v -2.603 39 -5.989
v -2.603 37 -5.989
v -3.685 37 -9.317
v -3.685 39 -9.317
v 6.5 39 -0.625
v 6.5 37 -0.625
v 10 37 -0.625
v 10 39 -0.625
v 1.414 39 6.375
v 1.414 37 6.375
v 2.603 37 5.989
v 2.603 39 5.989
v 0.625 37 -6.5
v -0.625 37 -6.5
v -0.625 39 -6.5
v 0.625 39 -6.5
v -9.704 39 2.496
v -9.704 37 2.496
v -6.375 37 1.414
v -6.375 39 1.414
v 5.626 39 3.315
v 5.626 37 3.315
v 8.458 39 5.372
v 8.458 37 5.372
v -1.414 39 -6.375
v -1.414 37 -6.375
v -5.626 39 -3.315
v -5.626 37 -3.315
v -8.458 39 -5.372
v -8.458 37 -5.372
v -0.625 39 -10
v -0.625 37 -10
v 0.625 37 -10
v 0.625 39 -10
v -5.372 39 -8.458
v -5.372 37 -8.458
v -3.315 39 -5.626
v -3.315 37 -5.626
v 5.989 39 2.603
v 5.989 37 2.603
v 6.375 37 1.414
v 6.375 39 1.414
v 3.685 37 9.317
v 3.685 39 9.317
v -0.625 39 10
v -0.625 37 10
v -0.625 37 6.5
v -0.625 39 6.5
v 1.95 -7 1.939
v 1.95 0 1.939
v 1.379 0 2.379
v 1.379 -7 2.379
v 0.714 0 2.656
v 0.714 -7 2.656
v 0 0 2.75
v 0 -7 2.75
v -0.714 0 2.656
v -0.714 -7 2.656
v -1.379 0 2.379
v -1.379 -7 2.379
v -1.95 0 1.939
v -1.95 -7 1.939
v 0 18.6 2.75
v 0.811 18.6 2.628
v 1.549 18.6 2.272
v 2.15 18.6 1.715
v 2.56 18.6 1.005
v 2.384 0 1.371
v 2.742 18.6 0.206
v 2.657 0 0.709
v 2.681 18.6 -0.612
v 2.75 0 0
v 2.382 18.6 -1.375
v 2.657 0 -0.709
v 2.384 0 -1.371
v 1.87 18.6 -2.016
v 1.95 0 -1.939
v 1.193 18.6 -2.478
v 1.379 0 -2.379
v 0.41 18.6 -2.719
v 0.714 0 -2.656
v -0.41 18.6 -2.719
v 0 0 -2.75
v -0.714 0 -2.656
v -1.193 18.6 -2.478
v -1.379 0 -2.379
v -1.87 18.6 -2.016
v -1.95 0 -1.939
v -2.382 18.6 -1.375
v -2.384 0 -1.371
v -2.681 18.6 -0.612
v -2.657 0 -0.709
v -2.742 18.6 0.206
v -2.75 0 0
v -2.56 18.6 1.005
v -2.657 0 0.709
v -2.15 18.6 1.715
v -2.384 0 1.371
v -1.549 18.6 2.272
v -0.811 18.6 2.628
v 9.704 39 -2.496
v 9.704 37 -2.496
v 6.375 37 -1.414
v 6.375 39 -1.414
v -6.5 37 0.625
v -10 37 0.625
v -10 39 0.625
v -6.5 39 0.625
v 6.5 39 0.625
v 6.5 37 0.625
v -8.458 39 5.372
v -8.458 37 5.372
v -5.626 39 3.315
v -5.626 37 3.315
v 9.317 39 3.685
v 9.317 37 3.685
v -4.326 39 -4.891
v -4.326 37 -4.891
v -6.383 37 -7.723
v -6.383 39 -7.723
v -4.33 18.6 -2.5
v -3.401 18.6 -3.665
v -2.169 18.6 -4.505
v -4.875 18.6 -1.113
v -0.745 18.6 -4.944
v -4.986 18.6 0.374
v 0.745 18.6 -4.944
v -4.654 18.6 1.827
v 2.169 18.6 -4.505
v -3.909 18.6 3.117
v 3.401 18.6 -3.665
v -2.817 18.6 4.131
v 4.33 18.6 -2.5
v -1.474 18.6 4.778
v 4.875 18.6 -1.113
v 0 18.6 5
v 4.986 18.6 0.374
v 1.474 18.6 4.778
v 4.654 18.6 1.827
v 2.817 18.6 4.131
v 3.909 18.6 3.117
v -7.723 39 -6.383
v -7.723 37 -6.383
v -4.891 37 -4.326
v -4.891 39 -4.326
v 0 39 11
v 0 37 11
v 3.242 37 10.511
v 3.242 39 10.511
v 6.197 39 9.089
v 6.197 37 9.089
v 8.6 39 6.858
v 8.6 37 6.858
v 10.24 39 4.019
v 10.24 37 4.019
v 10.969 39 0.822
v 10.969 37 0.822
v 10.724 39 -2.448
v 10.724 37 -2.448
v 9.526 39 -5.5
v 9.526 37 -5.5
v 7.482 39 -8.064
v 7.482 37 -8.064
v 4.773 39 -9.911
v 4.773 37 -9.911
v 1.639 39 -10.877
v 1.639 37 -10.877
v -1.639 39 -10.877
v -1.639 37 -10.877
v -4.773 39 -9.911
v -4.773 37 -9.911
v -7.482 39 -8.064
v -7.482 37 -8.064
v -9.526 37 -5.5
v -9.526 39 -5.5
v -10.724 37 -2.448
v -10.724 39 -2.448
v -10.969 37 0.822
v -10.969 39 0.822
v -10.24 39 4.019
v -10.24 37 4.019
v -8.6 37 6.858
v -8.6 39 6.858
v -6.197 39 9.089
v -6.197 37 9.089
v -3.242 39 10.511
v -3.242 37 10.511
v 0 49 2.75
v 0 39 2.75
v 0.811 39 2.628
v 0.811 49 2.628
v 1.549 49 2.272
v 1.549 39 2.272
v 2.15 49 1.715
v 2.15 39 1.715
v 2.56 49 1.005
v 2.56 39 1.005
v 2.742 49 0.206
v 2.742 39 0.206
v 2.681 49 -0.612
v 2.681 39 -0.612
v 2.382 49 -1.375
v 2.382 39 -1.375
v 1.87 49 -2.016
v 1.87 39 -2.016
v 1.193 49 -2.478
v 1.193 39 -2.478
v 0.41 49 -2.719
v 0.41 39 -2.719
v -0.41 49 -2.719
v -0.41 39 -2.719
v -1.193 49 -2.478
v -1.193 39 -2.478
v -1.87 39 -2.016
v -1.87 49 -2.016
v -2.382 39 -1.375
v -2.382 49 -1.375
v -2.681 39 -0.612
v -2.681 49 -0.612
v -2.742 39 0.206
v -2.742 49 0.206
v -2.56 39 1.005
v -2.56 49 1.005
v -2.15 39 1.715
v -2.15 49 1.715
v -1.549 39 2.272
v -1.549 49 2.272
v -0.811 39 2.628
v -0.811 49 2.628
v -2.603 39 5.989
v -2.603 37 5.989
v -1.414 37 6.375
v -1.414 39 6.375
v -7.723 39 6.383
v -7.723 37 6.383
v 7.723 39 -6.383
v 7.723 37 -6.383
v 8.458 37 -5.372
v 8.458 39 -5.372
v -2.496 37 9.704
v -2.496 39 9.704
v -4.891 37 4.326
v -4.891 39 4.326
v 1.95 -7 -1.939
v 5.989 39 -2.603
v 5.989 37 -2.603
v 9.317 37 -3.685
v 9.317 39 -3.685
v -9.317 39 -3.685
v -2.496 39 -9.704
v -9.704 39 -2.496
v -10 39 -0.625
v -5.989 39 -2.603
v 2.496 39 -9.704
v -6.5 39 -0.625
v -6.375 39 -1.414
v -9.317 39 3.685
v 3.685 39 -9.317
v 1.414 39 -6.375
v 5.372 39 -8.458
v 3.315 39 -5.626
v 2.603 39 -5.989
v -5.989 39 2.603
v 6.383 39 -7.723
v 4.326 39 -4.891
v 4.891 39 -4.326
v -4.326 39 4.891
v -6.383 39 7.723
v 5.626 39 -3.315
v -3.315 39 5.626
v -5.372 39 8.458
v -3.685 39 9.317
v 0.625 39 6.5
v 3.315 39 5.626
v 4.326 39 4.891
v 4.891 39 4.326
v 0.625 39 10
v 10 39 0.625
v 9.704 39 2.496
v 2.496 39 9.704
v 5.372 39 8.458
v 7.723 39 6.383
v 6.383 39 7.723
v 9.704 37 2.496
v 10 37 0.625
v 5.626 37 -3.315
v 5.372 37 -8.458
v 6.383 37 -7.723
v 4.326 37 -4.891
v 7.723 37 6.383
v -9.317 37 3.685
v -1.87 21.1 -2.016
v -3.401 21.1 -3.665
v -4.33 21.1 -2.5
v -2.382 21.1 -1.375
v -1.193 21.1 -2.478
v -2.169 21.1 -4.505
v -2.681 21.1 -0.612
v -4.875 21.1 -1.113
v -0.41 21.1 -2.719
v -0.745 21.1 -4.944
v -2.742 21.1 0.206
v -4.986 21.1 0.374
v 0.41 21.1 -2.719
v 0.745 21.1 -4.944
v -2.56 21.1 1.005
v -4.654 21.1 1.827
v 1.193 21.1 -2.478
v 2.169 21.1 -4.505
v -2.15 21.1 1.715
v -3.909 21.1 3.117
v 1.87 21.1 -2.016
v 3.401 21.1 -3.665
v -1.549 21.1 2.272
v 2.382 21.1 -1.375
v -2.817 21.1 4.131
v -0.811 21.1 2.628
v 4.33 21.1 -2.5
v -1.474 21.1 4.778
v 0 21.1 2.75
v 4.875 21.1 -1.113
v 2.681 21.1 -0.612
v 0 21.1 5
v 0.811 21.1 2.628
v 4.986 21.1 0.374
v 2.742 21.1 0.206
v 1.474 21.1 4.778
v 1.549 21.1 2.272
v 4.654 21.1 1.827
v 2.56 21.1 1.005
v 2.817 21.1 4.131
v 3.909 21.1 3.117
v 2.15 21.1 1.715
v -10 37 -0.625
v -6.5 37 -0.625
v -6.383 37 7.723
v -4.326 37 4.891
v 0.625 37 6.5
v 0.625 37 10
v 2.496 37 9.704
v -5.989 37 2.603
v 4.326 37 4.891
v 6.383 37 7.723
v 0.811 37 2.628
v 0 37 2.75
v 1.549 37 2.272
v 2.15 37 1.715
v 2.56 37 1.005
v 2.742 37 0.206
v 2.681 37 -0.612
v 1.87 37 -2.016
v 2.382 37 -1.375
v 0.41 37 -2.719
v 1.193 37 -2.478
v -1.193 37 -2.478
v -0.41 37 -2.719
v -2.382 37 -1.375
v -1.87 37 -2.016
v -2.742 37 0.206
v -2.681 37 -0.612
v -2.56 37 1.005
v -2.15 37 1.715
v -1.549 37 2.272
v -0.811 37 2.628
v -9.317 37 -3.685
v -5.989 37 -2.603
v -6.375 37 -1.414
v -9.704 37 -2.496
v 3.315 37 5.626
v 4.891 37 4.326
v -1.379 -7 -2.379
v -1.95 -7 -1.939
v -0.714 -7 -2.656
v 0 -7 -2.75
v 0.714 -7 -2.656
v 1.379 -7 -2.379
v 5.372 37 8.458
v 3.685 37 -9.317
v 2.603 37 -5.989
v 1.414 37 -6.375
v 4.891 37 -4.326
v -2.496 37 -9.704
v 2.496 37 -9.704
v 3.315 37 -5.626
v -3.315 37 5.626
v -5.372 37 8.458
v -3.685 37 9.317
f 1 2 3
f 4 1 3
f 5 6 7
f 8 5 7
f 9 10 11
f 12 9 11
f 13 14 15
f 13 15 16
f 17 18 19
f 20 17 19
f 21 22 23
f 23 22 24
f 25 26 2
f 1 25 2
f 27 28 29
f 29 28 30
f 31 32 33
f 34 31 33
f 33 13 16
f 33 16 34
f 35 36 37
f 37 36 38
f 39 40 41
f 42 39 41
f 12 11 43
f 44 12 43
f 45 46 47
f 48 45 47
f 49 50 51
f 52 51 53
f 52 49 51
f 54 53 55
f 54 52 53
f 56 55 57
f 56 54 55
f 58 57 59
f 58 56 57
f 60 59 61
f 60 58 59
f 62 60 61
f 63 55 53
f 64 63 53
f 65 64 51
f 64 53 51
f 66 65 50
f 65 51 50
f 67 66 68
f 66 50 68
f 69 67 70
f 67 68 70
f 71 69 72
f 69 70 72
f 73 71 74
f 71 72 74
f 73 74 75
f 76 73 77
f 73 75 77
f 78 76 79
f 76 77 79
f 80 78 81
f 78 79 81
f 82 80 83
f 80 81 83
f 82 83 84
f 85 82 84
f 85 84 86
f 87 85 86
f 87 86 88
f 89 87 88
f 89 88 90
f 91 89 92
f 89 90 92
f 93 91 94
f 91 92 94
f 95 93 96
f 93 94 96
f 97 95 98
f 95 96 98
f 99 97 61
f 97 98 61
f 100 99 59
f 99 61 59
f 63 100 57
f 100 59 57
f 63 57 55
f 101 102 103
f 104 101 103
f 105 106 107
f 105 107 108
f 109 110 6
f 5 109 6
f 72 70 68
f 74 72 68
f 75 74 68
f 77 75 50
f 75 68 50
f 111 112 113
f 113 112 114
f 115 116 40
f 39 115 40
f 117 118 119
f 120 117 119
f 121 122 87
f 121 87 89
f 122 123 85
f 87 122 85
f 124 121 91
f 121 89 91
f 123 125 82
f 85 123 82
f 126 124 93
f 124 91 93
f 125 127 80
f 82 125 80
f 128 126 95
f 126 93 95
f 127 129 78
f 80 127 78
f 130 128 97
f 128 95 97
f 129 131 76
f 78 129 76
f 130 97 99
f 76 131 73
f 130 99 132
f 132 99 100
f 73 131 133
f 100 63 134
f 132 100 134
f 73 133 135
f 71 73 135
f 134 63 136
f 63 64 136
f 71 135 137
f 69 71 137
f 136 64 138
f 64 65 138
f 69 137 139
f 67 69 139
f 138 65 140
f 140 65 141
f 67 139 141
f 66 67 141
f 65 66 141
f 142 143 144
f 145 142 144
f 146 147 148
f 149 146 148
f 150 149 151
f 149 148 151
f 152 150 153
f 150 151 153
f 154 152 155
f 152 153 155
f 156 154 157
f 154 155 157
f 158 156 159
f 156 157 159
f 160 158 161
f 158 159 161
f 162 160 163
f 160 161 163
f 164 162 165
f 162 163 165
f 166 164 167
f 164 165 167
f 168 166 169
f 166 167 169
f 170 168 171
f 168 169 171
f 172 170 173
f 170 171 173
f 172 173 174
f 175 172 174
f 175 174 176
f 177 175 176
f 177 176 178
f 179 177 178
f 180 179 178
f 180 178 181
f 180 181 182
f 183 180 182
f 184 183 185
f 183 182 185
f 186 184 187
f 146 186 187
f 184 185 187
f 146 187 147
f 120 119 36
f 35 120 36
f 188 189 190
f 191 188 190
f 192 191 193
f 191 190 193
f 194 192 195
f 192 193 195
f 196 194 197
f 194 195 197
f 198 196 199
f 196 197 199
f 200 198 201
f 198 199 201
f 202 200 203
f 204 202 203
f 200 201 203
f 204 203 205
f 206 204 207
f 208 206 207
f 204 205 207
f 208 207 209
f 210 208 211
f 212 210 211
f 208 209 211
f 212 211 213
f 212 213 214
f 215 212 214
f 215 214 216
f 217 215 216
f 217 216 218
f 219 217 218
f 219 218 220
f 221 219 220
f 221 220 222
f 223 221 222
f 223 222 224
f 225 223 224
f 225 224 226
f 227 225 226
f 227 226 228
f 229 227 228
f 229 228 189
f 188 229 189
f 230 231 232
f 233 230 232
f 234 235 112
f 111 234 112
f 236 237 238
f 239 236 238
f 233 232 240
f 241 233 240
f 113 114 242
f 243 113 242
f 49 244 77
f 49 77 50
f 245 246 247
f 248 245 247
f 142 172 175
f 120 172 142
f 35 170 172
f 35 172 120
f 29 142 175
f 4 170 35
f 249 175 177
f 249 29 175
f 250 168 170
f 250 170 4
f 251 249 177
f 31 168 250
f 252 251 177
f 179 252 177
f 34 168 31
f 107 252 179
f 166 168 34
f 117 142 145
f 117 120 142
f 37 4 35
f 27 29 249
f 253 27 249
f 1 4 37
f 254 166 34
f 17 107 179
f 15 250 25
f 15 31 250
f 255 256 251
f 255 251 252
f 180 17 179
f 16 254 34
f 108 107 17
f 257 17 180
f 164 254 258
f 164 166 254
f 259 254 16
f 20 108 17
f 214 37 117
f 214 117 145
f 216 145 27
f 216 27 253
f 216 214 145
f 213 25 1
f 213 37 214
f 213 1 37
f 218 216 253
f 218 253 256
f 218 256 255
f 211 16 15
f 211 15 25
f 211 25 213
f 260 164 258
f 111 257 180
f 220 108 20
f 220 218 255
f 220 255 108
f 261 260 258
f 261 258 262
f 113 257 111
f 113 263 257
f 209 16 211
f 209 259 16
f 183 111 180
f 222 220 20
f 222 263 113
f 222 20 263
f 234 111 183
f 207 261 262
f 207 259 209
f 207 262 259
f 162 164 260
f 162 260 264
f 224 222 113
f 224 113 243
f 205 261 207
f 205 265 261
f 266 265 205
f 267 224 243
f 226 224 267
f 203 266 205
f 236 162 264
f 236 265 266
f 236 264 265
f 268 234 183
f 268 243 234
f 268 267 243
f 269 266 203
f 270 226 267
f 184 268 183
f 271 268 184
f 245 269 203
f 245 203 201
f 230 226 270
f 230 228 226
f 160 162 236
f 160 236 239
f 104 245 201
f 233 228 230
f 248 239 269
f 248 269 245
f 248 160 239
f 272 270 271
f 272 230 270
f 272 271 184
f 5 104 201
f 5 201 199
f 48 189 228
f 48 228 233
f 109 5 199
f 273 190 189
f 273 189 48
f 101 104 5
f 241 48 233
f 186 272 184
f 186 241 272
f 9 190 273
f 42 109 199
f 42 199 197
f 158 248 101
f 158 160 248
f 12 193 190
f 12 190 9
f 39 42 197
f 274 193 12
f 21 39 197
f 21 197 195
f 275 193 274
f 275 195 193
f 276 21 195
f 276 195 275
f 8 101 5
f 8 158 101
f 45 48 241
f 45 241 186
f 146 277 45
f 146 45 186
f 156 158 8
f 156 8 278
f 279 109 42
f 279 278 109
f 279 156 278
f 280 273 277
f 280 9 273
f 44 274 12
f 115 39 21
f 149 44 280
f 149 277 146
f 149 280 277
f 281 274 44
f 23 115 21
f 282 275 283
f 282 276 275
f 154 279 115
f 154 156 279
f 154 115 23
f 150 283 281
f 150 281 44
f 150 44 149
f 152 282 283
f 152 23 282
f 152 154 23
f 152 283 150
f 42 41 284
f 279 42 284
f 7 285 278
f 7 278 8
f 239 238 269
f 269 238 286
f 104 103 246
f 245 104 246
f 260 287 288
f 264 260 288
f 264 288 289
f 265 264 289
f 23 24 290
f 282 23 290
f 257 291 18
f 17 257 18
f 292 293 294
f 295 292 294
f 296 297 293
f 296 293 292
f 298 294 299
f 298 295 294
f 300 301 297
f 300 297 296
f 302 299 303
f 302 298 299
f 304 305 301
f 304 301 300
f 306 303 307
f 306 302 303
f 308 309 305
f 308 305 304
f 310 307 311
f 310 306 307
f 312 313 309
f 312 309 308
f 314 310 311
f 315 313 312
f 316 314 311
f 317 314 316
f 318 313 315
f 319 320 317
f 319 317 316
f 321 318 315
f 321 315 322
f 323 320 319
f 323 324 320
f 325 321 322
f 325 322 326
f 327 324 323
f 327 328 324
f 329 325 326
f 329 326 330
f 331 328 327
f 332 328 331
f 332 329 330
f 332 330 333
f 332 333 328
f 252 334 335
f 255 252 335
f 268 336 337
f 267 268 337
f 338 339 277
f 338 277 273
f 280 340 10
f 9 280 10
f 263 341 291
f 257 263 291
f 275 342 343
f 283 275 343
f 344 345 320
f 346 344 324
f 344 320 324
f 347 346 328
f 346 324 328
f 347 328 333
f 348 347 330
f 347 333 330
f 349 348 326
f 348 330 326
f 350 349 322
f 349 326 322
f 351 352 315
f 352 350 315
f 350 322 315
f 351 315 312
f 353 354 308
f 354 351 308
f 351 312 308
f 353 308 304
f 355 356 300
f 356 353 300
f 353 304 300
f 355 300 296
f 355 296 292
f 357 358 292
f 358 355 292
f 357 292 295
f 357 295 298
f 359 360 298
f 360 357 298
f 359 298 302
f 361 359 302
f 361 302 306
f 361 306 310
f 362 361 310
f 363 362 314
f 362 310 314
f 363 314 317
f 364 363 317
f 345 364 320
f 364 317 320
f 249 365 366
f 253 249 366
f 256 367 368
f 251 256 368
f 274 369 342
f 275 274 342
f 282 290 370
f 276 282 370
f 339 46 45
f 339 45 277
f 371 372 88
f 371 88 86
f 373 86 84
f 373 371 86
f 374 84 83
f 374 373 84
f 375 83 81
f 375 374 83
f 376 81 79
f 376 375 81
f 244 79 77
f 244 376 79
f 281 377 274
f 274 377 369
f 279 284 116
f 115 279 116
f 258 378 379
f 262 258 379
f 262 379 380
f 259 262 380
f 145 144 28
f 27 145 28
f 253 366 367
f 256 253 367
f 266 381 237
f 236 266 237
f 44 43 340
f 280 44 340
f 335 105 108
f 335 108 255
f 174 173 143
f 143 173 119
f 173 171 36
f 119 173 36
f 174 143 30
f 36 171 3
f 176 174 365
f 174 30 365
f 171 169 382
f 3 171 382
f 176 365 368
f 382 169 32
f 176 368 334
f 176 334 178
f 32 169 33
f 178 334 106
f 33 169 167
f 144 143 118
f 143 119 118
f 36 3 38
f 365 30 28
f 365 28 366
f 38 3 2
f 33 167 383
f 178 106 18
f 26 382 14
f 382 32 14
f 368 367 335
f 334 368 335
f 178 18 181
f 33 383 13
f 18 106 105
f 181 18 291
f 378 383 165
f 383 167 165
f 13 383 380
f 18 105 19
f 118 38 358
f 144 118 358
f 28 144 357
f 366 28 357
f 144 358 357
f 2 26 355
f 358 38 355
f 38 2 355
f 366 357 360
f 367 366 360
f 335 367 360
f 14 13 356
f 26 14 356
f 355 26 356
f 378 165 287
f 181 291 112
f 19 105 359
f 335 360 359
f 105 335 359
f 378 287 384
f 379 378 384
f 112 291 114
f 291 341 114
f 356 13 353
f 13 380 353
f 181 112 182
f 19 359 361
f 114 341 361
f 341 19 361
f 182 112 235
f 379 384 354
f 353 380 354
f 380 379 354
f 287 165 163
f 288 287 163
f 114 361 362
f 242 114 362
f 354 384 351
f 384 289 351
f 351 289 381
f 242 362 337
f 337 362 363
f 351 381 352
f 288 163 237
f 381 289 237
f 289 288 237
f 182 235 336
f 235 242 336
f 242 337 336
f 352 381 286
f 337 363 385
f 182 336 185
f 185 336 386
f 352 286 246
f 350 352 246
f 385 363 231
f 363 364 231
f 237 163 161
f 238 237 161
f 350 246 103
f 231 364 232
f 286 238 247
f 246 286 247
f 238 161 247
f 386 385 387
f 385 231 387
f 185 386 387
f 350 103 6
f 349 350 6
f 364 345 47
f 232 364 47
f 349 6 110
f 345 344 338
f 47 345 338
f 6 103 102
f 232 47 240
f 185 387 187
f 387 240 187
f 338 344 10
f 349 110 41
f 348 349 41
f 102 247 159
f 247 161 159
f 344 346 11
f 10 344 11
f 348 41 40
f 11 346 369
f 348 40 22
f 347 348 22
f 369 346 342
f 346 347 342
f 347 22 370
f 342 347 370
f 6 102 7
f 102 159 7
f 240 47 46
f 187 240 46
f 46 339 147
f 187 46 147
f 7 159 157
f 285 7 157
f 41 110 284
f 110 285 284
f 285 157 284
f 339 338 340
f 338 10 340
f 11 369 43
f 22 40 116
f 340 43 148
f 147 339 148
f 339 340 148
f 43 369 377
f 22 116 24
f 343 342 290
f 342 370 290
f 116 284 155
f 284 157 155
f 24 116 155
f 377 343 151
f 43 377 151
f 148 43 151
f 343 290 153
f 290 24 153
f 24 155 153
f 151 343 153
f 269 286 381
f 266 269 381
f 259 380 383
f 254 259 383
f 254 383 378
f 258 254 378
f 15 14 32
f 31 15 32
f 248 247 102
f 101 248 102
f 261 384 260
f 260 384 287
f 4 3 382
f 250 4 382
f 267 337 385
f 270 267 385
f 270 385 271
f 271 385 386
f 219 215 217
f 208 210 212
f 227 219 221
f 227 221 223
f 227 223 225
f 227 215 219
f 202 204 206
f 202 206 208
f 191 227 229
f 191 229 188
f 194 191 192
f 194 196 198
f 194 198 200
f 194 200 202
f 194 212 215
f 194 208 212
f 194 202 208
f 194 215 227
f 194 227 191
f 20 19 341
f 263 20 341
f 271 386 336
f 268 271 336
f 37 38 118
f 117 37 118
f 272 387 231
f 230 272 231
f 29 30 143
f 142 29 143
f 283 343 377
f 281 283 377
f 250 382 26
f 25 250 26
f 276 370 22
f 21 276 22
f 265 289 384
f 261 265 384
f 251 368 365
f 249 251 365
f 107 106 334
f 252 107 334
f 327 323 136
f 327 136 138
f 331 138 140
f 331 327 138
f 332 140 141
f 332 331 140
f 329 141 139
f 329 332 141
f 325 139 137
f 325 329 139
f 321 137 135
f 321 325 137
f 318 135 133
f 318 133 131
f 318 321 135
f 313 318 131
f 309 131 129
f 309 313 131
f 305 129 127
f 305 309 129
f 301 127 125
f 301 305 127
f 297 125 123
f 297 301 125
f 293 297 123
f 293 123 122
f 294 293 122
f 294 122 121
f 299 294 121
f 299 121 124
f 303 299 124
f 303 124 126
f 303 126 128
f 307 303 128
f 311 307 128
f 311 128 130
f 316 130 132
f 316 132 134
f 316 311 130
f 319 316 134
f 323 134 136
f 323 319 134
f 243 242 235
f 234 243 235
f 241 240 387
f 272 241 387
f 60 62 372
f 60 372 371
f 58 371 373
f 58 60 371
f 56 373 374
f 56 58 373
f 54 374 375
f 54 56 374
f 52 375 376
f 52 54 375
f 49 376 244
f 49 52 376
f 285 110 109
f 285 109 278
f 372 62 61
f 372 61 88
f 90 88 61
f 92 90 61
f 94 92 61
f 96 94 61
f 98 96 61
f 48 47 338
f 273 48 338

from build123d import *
from build123d.topology import SkipClean

# Parameters (mm, degrees)
SKETCH_1_R      = 2.75
EXTRUDE_1_DEPTH = 49
EXTRUDE_START   = 7
EXTRUDE_2_DEPTH = 7
EXTRUDE_START_2 = -12
SKETCH_6_R      = 11
SKETCH_6_W      = 1.25
SKETCH_6_H      = 3.5
SKETCH_6_W_2    = 3.5
SKETCH_6_H_2    = 1.25
EXTRUDE_4_DEPTH = 2
EXTRUDE_START_3 = -27.9
SKETCH_7_R      = 5
EXTRUDE_5_DEPTH = 2.5


with BuildPart() as part:
    # 草图1 → 凸台-拉伸1 (new body)
    with BuildSketch(Plane(origin=(0, 0, 0), x_dir=(1, 0, 0), z_dir=(0, 1, 0))):
        Circle(SKETCH_1_R)
    extrude(amount=EXTRUDE_1_DEPTH)

    # 草图2 → 凸台-拉伸2 (add)
    with SkipClean():  # the faces are left unmerged after this step: merging them gives an invalid solid
        with BuildSketch(Plane.XZ.offset(EXTRUDE_START)):
            with BuildLine():
                Line((-1.95, 1.939071943), (-1.95, -1.939071943))
                ThreePointArc((-1.95, -1.939071943), (0, -2.75), (1.95, -1.939071943))
                Line((1.95, -1.939071943), (1.95, 1.939071943))
                ThreePointArc((1.95, 1.939071943), (0, 2.75), (-1.95, 1.939071943))
            make_face()
        extrude(amount=-EXTRUDE_2_DEPTH)

    # 草图6 → 凸台-拉伸4 (add)
    with SkipClean():  # the faces are left unmerged after this step: merging them gives an invalid solid
        with BuildSketch(Plane(origin=(0, 49, 0), x_dir=(1, 0, 0), z_dir=(0, 1, 0)).offset(EXTRUDE_START_2)):
            Circle(SKETCH_6_R)
            Polygon((2.495759621, 9.703700784), (3.684580266, 9.317429541), (2.603020786, 5.988731734), (1.414200141, 6.375002977), align=None, mode=Mode.SUBTRACT)
            with Locations((0, 8.25)):
                Rectangle(SKETCH_6_W, SKETCH_6_H, mode=Mode.SUBTRACT)
            Polygon((5.372216901, 8.457535726), (6.383488144, 7.722804161), (4.326239761, 4.891244681), (3.314968518, 5.625976246), align=None, mode=Mode.SUBTRACT)
            Polygon((7.722804161, 6.383488144), (8.457535726, 5.372216901), (5.625976246, 3.314968518), (4.891244681, 4.326239761), align=None, mode=Mode.SUBTRACT)
            Polygon((9.317429541, 3.684580266), (9.703700784, 2.495759621), (6.375002977, 1.414200141), (5.988731734, 2.603020786), align=None, mode=Mode.SUBTRACT)
            with Locations((8.25, 0)):
                Rectangle(SKETCH_6_W_2, SKETCH_6_H_2, mode=Mode.SUBTRACT)
            Polygon((9.703700784, -2.495759621), (9.317429541, -3.684580266), (5.988731734, -2.603020786), (6.375002977, -1.414200141), align=None, mode=Mode.SUBTRACT)
            Polygon((8.457535726, -5.372216901), (7.722804161, -6.383488144), (4.891244681, -4.326239761), (5.625976246, -3.314968518), align=None, mode=Mode.SUBTRACT)
            Polygon((6.383488144, -7.722804161), (5.372216901, -8.457535726), (3.314968518, -5.625976246), (4.326239761, -4.891244681), align=None, mode=Mode.SUBTRACT)
            Polygon((3.684580266, -9.317429541), (2.495759621, -9.703700784), (1.414200141, -6.375002977), (2.603020786, -5.988731734), align=None, mode=Mode.SUBTRACT)
            with Locations((0, -8.25)):
                Rectangle(SKETCH_6_W, SKETCH_6_H, mode=Mode.SUBTRACT)
            Polygon((-2.495759621, -9.703700784), (-3.684580266, -9.317429541), (-2.603020786, -5.988731734), (-1.414200141, -6.375002977), align=None, mode=Mode.SUBTRACT)
            Polygon((-5.372216901, -8.457535726), (-6.383488144, -7.722804161), (-4.326239761, -4.891244681), (-3.314968518, -5.625976246), align=None, mode=Mode.SUBTRACT)
            Polygon((-7.722804161, -6.383488144), (-8.457535726, -5.372216901), (-5.625976246, -3.314968518), (-4.891244681, -4.326239761), align=None, mode=Mode.SUBTRACT)
            Polygon((-9.317429541, -3.684580266), (-9.703700784, -2.495759621), (-6.375002977, -1.414200141), (-5.988731734, -2.603020786), align=None, mode=Mode.SUBTRACT)
            with Locations((-8.25, 0)):
                Rectangle(SKETCH_6_W_2, SKETCH_6_H_2, mode=Mode.SUBTRACT)
            Polygon((-9.703700784, 2.495759621), (-9.317429541, 3.684580266), (-5.988731734, 2.603020786), (-6.375002977, 1.414200141), align=None, mode=Mode.SUBTRACT)
            Polygon((-8.457535726, 5.372216901), (-7.722804161, 6.383488144), (-4.891244681, 4.326239761), (-5.625976246, 3.314968518), align=None, mode=Mode.SUBTRACT)
            Polygon((-6.383488144, 7.722804161), (-5.372216901, 8.457535726), (-3.314968518, 5.625976246), (-4.326239761, 4.891244681), align=None, mode=Mode.SUBTRACT)
            Polygon((-3.684580266, 9.317429541), (-2.495759621, 9.703700784), (-1.414200141, 6.375002977), (-2.603020786, 5.988731734), align=None, mode=Mode.SUBTRACT)
        extrude(amount=EXTRUDE_4_DEPTH)

    # 草图7 → 凸台-拉伸5 (add)
    with SkipClean():  # the faces are left unmerged after this step: merging them gives an invalid solid
        with BuildSketch(Plane(origin=(0, 49, 0), x_dir=(1, 0, 0), z_dir=(0, 1, 0)).offset(EXTRUDE_START_3)):
            Circle(SKETCH_7_R)
        extrude(amount=-EXTRUDE_5_DEPTH)


solid = part.part
